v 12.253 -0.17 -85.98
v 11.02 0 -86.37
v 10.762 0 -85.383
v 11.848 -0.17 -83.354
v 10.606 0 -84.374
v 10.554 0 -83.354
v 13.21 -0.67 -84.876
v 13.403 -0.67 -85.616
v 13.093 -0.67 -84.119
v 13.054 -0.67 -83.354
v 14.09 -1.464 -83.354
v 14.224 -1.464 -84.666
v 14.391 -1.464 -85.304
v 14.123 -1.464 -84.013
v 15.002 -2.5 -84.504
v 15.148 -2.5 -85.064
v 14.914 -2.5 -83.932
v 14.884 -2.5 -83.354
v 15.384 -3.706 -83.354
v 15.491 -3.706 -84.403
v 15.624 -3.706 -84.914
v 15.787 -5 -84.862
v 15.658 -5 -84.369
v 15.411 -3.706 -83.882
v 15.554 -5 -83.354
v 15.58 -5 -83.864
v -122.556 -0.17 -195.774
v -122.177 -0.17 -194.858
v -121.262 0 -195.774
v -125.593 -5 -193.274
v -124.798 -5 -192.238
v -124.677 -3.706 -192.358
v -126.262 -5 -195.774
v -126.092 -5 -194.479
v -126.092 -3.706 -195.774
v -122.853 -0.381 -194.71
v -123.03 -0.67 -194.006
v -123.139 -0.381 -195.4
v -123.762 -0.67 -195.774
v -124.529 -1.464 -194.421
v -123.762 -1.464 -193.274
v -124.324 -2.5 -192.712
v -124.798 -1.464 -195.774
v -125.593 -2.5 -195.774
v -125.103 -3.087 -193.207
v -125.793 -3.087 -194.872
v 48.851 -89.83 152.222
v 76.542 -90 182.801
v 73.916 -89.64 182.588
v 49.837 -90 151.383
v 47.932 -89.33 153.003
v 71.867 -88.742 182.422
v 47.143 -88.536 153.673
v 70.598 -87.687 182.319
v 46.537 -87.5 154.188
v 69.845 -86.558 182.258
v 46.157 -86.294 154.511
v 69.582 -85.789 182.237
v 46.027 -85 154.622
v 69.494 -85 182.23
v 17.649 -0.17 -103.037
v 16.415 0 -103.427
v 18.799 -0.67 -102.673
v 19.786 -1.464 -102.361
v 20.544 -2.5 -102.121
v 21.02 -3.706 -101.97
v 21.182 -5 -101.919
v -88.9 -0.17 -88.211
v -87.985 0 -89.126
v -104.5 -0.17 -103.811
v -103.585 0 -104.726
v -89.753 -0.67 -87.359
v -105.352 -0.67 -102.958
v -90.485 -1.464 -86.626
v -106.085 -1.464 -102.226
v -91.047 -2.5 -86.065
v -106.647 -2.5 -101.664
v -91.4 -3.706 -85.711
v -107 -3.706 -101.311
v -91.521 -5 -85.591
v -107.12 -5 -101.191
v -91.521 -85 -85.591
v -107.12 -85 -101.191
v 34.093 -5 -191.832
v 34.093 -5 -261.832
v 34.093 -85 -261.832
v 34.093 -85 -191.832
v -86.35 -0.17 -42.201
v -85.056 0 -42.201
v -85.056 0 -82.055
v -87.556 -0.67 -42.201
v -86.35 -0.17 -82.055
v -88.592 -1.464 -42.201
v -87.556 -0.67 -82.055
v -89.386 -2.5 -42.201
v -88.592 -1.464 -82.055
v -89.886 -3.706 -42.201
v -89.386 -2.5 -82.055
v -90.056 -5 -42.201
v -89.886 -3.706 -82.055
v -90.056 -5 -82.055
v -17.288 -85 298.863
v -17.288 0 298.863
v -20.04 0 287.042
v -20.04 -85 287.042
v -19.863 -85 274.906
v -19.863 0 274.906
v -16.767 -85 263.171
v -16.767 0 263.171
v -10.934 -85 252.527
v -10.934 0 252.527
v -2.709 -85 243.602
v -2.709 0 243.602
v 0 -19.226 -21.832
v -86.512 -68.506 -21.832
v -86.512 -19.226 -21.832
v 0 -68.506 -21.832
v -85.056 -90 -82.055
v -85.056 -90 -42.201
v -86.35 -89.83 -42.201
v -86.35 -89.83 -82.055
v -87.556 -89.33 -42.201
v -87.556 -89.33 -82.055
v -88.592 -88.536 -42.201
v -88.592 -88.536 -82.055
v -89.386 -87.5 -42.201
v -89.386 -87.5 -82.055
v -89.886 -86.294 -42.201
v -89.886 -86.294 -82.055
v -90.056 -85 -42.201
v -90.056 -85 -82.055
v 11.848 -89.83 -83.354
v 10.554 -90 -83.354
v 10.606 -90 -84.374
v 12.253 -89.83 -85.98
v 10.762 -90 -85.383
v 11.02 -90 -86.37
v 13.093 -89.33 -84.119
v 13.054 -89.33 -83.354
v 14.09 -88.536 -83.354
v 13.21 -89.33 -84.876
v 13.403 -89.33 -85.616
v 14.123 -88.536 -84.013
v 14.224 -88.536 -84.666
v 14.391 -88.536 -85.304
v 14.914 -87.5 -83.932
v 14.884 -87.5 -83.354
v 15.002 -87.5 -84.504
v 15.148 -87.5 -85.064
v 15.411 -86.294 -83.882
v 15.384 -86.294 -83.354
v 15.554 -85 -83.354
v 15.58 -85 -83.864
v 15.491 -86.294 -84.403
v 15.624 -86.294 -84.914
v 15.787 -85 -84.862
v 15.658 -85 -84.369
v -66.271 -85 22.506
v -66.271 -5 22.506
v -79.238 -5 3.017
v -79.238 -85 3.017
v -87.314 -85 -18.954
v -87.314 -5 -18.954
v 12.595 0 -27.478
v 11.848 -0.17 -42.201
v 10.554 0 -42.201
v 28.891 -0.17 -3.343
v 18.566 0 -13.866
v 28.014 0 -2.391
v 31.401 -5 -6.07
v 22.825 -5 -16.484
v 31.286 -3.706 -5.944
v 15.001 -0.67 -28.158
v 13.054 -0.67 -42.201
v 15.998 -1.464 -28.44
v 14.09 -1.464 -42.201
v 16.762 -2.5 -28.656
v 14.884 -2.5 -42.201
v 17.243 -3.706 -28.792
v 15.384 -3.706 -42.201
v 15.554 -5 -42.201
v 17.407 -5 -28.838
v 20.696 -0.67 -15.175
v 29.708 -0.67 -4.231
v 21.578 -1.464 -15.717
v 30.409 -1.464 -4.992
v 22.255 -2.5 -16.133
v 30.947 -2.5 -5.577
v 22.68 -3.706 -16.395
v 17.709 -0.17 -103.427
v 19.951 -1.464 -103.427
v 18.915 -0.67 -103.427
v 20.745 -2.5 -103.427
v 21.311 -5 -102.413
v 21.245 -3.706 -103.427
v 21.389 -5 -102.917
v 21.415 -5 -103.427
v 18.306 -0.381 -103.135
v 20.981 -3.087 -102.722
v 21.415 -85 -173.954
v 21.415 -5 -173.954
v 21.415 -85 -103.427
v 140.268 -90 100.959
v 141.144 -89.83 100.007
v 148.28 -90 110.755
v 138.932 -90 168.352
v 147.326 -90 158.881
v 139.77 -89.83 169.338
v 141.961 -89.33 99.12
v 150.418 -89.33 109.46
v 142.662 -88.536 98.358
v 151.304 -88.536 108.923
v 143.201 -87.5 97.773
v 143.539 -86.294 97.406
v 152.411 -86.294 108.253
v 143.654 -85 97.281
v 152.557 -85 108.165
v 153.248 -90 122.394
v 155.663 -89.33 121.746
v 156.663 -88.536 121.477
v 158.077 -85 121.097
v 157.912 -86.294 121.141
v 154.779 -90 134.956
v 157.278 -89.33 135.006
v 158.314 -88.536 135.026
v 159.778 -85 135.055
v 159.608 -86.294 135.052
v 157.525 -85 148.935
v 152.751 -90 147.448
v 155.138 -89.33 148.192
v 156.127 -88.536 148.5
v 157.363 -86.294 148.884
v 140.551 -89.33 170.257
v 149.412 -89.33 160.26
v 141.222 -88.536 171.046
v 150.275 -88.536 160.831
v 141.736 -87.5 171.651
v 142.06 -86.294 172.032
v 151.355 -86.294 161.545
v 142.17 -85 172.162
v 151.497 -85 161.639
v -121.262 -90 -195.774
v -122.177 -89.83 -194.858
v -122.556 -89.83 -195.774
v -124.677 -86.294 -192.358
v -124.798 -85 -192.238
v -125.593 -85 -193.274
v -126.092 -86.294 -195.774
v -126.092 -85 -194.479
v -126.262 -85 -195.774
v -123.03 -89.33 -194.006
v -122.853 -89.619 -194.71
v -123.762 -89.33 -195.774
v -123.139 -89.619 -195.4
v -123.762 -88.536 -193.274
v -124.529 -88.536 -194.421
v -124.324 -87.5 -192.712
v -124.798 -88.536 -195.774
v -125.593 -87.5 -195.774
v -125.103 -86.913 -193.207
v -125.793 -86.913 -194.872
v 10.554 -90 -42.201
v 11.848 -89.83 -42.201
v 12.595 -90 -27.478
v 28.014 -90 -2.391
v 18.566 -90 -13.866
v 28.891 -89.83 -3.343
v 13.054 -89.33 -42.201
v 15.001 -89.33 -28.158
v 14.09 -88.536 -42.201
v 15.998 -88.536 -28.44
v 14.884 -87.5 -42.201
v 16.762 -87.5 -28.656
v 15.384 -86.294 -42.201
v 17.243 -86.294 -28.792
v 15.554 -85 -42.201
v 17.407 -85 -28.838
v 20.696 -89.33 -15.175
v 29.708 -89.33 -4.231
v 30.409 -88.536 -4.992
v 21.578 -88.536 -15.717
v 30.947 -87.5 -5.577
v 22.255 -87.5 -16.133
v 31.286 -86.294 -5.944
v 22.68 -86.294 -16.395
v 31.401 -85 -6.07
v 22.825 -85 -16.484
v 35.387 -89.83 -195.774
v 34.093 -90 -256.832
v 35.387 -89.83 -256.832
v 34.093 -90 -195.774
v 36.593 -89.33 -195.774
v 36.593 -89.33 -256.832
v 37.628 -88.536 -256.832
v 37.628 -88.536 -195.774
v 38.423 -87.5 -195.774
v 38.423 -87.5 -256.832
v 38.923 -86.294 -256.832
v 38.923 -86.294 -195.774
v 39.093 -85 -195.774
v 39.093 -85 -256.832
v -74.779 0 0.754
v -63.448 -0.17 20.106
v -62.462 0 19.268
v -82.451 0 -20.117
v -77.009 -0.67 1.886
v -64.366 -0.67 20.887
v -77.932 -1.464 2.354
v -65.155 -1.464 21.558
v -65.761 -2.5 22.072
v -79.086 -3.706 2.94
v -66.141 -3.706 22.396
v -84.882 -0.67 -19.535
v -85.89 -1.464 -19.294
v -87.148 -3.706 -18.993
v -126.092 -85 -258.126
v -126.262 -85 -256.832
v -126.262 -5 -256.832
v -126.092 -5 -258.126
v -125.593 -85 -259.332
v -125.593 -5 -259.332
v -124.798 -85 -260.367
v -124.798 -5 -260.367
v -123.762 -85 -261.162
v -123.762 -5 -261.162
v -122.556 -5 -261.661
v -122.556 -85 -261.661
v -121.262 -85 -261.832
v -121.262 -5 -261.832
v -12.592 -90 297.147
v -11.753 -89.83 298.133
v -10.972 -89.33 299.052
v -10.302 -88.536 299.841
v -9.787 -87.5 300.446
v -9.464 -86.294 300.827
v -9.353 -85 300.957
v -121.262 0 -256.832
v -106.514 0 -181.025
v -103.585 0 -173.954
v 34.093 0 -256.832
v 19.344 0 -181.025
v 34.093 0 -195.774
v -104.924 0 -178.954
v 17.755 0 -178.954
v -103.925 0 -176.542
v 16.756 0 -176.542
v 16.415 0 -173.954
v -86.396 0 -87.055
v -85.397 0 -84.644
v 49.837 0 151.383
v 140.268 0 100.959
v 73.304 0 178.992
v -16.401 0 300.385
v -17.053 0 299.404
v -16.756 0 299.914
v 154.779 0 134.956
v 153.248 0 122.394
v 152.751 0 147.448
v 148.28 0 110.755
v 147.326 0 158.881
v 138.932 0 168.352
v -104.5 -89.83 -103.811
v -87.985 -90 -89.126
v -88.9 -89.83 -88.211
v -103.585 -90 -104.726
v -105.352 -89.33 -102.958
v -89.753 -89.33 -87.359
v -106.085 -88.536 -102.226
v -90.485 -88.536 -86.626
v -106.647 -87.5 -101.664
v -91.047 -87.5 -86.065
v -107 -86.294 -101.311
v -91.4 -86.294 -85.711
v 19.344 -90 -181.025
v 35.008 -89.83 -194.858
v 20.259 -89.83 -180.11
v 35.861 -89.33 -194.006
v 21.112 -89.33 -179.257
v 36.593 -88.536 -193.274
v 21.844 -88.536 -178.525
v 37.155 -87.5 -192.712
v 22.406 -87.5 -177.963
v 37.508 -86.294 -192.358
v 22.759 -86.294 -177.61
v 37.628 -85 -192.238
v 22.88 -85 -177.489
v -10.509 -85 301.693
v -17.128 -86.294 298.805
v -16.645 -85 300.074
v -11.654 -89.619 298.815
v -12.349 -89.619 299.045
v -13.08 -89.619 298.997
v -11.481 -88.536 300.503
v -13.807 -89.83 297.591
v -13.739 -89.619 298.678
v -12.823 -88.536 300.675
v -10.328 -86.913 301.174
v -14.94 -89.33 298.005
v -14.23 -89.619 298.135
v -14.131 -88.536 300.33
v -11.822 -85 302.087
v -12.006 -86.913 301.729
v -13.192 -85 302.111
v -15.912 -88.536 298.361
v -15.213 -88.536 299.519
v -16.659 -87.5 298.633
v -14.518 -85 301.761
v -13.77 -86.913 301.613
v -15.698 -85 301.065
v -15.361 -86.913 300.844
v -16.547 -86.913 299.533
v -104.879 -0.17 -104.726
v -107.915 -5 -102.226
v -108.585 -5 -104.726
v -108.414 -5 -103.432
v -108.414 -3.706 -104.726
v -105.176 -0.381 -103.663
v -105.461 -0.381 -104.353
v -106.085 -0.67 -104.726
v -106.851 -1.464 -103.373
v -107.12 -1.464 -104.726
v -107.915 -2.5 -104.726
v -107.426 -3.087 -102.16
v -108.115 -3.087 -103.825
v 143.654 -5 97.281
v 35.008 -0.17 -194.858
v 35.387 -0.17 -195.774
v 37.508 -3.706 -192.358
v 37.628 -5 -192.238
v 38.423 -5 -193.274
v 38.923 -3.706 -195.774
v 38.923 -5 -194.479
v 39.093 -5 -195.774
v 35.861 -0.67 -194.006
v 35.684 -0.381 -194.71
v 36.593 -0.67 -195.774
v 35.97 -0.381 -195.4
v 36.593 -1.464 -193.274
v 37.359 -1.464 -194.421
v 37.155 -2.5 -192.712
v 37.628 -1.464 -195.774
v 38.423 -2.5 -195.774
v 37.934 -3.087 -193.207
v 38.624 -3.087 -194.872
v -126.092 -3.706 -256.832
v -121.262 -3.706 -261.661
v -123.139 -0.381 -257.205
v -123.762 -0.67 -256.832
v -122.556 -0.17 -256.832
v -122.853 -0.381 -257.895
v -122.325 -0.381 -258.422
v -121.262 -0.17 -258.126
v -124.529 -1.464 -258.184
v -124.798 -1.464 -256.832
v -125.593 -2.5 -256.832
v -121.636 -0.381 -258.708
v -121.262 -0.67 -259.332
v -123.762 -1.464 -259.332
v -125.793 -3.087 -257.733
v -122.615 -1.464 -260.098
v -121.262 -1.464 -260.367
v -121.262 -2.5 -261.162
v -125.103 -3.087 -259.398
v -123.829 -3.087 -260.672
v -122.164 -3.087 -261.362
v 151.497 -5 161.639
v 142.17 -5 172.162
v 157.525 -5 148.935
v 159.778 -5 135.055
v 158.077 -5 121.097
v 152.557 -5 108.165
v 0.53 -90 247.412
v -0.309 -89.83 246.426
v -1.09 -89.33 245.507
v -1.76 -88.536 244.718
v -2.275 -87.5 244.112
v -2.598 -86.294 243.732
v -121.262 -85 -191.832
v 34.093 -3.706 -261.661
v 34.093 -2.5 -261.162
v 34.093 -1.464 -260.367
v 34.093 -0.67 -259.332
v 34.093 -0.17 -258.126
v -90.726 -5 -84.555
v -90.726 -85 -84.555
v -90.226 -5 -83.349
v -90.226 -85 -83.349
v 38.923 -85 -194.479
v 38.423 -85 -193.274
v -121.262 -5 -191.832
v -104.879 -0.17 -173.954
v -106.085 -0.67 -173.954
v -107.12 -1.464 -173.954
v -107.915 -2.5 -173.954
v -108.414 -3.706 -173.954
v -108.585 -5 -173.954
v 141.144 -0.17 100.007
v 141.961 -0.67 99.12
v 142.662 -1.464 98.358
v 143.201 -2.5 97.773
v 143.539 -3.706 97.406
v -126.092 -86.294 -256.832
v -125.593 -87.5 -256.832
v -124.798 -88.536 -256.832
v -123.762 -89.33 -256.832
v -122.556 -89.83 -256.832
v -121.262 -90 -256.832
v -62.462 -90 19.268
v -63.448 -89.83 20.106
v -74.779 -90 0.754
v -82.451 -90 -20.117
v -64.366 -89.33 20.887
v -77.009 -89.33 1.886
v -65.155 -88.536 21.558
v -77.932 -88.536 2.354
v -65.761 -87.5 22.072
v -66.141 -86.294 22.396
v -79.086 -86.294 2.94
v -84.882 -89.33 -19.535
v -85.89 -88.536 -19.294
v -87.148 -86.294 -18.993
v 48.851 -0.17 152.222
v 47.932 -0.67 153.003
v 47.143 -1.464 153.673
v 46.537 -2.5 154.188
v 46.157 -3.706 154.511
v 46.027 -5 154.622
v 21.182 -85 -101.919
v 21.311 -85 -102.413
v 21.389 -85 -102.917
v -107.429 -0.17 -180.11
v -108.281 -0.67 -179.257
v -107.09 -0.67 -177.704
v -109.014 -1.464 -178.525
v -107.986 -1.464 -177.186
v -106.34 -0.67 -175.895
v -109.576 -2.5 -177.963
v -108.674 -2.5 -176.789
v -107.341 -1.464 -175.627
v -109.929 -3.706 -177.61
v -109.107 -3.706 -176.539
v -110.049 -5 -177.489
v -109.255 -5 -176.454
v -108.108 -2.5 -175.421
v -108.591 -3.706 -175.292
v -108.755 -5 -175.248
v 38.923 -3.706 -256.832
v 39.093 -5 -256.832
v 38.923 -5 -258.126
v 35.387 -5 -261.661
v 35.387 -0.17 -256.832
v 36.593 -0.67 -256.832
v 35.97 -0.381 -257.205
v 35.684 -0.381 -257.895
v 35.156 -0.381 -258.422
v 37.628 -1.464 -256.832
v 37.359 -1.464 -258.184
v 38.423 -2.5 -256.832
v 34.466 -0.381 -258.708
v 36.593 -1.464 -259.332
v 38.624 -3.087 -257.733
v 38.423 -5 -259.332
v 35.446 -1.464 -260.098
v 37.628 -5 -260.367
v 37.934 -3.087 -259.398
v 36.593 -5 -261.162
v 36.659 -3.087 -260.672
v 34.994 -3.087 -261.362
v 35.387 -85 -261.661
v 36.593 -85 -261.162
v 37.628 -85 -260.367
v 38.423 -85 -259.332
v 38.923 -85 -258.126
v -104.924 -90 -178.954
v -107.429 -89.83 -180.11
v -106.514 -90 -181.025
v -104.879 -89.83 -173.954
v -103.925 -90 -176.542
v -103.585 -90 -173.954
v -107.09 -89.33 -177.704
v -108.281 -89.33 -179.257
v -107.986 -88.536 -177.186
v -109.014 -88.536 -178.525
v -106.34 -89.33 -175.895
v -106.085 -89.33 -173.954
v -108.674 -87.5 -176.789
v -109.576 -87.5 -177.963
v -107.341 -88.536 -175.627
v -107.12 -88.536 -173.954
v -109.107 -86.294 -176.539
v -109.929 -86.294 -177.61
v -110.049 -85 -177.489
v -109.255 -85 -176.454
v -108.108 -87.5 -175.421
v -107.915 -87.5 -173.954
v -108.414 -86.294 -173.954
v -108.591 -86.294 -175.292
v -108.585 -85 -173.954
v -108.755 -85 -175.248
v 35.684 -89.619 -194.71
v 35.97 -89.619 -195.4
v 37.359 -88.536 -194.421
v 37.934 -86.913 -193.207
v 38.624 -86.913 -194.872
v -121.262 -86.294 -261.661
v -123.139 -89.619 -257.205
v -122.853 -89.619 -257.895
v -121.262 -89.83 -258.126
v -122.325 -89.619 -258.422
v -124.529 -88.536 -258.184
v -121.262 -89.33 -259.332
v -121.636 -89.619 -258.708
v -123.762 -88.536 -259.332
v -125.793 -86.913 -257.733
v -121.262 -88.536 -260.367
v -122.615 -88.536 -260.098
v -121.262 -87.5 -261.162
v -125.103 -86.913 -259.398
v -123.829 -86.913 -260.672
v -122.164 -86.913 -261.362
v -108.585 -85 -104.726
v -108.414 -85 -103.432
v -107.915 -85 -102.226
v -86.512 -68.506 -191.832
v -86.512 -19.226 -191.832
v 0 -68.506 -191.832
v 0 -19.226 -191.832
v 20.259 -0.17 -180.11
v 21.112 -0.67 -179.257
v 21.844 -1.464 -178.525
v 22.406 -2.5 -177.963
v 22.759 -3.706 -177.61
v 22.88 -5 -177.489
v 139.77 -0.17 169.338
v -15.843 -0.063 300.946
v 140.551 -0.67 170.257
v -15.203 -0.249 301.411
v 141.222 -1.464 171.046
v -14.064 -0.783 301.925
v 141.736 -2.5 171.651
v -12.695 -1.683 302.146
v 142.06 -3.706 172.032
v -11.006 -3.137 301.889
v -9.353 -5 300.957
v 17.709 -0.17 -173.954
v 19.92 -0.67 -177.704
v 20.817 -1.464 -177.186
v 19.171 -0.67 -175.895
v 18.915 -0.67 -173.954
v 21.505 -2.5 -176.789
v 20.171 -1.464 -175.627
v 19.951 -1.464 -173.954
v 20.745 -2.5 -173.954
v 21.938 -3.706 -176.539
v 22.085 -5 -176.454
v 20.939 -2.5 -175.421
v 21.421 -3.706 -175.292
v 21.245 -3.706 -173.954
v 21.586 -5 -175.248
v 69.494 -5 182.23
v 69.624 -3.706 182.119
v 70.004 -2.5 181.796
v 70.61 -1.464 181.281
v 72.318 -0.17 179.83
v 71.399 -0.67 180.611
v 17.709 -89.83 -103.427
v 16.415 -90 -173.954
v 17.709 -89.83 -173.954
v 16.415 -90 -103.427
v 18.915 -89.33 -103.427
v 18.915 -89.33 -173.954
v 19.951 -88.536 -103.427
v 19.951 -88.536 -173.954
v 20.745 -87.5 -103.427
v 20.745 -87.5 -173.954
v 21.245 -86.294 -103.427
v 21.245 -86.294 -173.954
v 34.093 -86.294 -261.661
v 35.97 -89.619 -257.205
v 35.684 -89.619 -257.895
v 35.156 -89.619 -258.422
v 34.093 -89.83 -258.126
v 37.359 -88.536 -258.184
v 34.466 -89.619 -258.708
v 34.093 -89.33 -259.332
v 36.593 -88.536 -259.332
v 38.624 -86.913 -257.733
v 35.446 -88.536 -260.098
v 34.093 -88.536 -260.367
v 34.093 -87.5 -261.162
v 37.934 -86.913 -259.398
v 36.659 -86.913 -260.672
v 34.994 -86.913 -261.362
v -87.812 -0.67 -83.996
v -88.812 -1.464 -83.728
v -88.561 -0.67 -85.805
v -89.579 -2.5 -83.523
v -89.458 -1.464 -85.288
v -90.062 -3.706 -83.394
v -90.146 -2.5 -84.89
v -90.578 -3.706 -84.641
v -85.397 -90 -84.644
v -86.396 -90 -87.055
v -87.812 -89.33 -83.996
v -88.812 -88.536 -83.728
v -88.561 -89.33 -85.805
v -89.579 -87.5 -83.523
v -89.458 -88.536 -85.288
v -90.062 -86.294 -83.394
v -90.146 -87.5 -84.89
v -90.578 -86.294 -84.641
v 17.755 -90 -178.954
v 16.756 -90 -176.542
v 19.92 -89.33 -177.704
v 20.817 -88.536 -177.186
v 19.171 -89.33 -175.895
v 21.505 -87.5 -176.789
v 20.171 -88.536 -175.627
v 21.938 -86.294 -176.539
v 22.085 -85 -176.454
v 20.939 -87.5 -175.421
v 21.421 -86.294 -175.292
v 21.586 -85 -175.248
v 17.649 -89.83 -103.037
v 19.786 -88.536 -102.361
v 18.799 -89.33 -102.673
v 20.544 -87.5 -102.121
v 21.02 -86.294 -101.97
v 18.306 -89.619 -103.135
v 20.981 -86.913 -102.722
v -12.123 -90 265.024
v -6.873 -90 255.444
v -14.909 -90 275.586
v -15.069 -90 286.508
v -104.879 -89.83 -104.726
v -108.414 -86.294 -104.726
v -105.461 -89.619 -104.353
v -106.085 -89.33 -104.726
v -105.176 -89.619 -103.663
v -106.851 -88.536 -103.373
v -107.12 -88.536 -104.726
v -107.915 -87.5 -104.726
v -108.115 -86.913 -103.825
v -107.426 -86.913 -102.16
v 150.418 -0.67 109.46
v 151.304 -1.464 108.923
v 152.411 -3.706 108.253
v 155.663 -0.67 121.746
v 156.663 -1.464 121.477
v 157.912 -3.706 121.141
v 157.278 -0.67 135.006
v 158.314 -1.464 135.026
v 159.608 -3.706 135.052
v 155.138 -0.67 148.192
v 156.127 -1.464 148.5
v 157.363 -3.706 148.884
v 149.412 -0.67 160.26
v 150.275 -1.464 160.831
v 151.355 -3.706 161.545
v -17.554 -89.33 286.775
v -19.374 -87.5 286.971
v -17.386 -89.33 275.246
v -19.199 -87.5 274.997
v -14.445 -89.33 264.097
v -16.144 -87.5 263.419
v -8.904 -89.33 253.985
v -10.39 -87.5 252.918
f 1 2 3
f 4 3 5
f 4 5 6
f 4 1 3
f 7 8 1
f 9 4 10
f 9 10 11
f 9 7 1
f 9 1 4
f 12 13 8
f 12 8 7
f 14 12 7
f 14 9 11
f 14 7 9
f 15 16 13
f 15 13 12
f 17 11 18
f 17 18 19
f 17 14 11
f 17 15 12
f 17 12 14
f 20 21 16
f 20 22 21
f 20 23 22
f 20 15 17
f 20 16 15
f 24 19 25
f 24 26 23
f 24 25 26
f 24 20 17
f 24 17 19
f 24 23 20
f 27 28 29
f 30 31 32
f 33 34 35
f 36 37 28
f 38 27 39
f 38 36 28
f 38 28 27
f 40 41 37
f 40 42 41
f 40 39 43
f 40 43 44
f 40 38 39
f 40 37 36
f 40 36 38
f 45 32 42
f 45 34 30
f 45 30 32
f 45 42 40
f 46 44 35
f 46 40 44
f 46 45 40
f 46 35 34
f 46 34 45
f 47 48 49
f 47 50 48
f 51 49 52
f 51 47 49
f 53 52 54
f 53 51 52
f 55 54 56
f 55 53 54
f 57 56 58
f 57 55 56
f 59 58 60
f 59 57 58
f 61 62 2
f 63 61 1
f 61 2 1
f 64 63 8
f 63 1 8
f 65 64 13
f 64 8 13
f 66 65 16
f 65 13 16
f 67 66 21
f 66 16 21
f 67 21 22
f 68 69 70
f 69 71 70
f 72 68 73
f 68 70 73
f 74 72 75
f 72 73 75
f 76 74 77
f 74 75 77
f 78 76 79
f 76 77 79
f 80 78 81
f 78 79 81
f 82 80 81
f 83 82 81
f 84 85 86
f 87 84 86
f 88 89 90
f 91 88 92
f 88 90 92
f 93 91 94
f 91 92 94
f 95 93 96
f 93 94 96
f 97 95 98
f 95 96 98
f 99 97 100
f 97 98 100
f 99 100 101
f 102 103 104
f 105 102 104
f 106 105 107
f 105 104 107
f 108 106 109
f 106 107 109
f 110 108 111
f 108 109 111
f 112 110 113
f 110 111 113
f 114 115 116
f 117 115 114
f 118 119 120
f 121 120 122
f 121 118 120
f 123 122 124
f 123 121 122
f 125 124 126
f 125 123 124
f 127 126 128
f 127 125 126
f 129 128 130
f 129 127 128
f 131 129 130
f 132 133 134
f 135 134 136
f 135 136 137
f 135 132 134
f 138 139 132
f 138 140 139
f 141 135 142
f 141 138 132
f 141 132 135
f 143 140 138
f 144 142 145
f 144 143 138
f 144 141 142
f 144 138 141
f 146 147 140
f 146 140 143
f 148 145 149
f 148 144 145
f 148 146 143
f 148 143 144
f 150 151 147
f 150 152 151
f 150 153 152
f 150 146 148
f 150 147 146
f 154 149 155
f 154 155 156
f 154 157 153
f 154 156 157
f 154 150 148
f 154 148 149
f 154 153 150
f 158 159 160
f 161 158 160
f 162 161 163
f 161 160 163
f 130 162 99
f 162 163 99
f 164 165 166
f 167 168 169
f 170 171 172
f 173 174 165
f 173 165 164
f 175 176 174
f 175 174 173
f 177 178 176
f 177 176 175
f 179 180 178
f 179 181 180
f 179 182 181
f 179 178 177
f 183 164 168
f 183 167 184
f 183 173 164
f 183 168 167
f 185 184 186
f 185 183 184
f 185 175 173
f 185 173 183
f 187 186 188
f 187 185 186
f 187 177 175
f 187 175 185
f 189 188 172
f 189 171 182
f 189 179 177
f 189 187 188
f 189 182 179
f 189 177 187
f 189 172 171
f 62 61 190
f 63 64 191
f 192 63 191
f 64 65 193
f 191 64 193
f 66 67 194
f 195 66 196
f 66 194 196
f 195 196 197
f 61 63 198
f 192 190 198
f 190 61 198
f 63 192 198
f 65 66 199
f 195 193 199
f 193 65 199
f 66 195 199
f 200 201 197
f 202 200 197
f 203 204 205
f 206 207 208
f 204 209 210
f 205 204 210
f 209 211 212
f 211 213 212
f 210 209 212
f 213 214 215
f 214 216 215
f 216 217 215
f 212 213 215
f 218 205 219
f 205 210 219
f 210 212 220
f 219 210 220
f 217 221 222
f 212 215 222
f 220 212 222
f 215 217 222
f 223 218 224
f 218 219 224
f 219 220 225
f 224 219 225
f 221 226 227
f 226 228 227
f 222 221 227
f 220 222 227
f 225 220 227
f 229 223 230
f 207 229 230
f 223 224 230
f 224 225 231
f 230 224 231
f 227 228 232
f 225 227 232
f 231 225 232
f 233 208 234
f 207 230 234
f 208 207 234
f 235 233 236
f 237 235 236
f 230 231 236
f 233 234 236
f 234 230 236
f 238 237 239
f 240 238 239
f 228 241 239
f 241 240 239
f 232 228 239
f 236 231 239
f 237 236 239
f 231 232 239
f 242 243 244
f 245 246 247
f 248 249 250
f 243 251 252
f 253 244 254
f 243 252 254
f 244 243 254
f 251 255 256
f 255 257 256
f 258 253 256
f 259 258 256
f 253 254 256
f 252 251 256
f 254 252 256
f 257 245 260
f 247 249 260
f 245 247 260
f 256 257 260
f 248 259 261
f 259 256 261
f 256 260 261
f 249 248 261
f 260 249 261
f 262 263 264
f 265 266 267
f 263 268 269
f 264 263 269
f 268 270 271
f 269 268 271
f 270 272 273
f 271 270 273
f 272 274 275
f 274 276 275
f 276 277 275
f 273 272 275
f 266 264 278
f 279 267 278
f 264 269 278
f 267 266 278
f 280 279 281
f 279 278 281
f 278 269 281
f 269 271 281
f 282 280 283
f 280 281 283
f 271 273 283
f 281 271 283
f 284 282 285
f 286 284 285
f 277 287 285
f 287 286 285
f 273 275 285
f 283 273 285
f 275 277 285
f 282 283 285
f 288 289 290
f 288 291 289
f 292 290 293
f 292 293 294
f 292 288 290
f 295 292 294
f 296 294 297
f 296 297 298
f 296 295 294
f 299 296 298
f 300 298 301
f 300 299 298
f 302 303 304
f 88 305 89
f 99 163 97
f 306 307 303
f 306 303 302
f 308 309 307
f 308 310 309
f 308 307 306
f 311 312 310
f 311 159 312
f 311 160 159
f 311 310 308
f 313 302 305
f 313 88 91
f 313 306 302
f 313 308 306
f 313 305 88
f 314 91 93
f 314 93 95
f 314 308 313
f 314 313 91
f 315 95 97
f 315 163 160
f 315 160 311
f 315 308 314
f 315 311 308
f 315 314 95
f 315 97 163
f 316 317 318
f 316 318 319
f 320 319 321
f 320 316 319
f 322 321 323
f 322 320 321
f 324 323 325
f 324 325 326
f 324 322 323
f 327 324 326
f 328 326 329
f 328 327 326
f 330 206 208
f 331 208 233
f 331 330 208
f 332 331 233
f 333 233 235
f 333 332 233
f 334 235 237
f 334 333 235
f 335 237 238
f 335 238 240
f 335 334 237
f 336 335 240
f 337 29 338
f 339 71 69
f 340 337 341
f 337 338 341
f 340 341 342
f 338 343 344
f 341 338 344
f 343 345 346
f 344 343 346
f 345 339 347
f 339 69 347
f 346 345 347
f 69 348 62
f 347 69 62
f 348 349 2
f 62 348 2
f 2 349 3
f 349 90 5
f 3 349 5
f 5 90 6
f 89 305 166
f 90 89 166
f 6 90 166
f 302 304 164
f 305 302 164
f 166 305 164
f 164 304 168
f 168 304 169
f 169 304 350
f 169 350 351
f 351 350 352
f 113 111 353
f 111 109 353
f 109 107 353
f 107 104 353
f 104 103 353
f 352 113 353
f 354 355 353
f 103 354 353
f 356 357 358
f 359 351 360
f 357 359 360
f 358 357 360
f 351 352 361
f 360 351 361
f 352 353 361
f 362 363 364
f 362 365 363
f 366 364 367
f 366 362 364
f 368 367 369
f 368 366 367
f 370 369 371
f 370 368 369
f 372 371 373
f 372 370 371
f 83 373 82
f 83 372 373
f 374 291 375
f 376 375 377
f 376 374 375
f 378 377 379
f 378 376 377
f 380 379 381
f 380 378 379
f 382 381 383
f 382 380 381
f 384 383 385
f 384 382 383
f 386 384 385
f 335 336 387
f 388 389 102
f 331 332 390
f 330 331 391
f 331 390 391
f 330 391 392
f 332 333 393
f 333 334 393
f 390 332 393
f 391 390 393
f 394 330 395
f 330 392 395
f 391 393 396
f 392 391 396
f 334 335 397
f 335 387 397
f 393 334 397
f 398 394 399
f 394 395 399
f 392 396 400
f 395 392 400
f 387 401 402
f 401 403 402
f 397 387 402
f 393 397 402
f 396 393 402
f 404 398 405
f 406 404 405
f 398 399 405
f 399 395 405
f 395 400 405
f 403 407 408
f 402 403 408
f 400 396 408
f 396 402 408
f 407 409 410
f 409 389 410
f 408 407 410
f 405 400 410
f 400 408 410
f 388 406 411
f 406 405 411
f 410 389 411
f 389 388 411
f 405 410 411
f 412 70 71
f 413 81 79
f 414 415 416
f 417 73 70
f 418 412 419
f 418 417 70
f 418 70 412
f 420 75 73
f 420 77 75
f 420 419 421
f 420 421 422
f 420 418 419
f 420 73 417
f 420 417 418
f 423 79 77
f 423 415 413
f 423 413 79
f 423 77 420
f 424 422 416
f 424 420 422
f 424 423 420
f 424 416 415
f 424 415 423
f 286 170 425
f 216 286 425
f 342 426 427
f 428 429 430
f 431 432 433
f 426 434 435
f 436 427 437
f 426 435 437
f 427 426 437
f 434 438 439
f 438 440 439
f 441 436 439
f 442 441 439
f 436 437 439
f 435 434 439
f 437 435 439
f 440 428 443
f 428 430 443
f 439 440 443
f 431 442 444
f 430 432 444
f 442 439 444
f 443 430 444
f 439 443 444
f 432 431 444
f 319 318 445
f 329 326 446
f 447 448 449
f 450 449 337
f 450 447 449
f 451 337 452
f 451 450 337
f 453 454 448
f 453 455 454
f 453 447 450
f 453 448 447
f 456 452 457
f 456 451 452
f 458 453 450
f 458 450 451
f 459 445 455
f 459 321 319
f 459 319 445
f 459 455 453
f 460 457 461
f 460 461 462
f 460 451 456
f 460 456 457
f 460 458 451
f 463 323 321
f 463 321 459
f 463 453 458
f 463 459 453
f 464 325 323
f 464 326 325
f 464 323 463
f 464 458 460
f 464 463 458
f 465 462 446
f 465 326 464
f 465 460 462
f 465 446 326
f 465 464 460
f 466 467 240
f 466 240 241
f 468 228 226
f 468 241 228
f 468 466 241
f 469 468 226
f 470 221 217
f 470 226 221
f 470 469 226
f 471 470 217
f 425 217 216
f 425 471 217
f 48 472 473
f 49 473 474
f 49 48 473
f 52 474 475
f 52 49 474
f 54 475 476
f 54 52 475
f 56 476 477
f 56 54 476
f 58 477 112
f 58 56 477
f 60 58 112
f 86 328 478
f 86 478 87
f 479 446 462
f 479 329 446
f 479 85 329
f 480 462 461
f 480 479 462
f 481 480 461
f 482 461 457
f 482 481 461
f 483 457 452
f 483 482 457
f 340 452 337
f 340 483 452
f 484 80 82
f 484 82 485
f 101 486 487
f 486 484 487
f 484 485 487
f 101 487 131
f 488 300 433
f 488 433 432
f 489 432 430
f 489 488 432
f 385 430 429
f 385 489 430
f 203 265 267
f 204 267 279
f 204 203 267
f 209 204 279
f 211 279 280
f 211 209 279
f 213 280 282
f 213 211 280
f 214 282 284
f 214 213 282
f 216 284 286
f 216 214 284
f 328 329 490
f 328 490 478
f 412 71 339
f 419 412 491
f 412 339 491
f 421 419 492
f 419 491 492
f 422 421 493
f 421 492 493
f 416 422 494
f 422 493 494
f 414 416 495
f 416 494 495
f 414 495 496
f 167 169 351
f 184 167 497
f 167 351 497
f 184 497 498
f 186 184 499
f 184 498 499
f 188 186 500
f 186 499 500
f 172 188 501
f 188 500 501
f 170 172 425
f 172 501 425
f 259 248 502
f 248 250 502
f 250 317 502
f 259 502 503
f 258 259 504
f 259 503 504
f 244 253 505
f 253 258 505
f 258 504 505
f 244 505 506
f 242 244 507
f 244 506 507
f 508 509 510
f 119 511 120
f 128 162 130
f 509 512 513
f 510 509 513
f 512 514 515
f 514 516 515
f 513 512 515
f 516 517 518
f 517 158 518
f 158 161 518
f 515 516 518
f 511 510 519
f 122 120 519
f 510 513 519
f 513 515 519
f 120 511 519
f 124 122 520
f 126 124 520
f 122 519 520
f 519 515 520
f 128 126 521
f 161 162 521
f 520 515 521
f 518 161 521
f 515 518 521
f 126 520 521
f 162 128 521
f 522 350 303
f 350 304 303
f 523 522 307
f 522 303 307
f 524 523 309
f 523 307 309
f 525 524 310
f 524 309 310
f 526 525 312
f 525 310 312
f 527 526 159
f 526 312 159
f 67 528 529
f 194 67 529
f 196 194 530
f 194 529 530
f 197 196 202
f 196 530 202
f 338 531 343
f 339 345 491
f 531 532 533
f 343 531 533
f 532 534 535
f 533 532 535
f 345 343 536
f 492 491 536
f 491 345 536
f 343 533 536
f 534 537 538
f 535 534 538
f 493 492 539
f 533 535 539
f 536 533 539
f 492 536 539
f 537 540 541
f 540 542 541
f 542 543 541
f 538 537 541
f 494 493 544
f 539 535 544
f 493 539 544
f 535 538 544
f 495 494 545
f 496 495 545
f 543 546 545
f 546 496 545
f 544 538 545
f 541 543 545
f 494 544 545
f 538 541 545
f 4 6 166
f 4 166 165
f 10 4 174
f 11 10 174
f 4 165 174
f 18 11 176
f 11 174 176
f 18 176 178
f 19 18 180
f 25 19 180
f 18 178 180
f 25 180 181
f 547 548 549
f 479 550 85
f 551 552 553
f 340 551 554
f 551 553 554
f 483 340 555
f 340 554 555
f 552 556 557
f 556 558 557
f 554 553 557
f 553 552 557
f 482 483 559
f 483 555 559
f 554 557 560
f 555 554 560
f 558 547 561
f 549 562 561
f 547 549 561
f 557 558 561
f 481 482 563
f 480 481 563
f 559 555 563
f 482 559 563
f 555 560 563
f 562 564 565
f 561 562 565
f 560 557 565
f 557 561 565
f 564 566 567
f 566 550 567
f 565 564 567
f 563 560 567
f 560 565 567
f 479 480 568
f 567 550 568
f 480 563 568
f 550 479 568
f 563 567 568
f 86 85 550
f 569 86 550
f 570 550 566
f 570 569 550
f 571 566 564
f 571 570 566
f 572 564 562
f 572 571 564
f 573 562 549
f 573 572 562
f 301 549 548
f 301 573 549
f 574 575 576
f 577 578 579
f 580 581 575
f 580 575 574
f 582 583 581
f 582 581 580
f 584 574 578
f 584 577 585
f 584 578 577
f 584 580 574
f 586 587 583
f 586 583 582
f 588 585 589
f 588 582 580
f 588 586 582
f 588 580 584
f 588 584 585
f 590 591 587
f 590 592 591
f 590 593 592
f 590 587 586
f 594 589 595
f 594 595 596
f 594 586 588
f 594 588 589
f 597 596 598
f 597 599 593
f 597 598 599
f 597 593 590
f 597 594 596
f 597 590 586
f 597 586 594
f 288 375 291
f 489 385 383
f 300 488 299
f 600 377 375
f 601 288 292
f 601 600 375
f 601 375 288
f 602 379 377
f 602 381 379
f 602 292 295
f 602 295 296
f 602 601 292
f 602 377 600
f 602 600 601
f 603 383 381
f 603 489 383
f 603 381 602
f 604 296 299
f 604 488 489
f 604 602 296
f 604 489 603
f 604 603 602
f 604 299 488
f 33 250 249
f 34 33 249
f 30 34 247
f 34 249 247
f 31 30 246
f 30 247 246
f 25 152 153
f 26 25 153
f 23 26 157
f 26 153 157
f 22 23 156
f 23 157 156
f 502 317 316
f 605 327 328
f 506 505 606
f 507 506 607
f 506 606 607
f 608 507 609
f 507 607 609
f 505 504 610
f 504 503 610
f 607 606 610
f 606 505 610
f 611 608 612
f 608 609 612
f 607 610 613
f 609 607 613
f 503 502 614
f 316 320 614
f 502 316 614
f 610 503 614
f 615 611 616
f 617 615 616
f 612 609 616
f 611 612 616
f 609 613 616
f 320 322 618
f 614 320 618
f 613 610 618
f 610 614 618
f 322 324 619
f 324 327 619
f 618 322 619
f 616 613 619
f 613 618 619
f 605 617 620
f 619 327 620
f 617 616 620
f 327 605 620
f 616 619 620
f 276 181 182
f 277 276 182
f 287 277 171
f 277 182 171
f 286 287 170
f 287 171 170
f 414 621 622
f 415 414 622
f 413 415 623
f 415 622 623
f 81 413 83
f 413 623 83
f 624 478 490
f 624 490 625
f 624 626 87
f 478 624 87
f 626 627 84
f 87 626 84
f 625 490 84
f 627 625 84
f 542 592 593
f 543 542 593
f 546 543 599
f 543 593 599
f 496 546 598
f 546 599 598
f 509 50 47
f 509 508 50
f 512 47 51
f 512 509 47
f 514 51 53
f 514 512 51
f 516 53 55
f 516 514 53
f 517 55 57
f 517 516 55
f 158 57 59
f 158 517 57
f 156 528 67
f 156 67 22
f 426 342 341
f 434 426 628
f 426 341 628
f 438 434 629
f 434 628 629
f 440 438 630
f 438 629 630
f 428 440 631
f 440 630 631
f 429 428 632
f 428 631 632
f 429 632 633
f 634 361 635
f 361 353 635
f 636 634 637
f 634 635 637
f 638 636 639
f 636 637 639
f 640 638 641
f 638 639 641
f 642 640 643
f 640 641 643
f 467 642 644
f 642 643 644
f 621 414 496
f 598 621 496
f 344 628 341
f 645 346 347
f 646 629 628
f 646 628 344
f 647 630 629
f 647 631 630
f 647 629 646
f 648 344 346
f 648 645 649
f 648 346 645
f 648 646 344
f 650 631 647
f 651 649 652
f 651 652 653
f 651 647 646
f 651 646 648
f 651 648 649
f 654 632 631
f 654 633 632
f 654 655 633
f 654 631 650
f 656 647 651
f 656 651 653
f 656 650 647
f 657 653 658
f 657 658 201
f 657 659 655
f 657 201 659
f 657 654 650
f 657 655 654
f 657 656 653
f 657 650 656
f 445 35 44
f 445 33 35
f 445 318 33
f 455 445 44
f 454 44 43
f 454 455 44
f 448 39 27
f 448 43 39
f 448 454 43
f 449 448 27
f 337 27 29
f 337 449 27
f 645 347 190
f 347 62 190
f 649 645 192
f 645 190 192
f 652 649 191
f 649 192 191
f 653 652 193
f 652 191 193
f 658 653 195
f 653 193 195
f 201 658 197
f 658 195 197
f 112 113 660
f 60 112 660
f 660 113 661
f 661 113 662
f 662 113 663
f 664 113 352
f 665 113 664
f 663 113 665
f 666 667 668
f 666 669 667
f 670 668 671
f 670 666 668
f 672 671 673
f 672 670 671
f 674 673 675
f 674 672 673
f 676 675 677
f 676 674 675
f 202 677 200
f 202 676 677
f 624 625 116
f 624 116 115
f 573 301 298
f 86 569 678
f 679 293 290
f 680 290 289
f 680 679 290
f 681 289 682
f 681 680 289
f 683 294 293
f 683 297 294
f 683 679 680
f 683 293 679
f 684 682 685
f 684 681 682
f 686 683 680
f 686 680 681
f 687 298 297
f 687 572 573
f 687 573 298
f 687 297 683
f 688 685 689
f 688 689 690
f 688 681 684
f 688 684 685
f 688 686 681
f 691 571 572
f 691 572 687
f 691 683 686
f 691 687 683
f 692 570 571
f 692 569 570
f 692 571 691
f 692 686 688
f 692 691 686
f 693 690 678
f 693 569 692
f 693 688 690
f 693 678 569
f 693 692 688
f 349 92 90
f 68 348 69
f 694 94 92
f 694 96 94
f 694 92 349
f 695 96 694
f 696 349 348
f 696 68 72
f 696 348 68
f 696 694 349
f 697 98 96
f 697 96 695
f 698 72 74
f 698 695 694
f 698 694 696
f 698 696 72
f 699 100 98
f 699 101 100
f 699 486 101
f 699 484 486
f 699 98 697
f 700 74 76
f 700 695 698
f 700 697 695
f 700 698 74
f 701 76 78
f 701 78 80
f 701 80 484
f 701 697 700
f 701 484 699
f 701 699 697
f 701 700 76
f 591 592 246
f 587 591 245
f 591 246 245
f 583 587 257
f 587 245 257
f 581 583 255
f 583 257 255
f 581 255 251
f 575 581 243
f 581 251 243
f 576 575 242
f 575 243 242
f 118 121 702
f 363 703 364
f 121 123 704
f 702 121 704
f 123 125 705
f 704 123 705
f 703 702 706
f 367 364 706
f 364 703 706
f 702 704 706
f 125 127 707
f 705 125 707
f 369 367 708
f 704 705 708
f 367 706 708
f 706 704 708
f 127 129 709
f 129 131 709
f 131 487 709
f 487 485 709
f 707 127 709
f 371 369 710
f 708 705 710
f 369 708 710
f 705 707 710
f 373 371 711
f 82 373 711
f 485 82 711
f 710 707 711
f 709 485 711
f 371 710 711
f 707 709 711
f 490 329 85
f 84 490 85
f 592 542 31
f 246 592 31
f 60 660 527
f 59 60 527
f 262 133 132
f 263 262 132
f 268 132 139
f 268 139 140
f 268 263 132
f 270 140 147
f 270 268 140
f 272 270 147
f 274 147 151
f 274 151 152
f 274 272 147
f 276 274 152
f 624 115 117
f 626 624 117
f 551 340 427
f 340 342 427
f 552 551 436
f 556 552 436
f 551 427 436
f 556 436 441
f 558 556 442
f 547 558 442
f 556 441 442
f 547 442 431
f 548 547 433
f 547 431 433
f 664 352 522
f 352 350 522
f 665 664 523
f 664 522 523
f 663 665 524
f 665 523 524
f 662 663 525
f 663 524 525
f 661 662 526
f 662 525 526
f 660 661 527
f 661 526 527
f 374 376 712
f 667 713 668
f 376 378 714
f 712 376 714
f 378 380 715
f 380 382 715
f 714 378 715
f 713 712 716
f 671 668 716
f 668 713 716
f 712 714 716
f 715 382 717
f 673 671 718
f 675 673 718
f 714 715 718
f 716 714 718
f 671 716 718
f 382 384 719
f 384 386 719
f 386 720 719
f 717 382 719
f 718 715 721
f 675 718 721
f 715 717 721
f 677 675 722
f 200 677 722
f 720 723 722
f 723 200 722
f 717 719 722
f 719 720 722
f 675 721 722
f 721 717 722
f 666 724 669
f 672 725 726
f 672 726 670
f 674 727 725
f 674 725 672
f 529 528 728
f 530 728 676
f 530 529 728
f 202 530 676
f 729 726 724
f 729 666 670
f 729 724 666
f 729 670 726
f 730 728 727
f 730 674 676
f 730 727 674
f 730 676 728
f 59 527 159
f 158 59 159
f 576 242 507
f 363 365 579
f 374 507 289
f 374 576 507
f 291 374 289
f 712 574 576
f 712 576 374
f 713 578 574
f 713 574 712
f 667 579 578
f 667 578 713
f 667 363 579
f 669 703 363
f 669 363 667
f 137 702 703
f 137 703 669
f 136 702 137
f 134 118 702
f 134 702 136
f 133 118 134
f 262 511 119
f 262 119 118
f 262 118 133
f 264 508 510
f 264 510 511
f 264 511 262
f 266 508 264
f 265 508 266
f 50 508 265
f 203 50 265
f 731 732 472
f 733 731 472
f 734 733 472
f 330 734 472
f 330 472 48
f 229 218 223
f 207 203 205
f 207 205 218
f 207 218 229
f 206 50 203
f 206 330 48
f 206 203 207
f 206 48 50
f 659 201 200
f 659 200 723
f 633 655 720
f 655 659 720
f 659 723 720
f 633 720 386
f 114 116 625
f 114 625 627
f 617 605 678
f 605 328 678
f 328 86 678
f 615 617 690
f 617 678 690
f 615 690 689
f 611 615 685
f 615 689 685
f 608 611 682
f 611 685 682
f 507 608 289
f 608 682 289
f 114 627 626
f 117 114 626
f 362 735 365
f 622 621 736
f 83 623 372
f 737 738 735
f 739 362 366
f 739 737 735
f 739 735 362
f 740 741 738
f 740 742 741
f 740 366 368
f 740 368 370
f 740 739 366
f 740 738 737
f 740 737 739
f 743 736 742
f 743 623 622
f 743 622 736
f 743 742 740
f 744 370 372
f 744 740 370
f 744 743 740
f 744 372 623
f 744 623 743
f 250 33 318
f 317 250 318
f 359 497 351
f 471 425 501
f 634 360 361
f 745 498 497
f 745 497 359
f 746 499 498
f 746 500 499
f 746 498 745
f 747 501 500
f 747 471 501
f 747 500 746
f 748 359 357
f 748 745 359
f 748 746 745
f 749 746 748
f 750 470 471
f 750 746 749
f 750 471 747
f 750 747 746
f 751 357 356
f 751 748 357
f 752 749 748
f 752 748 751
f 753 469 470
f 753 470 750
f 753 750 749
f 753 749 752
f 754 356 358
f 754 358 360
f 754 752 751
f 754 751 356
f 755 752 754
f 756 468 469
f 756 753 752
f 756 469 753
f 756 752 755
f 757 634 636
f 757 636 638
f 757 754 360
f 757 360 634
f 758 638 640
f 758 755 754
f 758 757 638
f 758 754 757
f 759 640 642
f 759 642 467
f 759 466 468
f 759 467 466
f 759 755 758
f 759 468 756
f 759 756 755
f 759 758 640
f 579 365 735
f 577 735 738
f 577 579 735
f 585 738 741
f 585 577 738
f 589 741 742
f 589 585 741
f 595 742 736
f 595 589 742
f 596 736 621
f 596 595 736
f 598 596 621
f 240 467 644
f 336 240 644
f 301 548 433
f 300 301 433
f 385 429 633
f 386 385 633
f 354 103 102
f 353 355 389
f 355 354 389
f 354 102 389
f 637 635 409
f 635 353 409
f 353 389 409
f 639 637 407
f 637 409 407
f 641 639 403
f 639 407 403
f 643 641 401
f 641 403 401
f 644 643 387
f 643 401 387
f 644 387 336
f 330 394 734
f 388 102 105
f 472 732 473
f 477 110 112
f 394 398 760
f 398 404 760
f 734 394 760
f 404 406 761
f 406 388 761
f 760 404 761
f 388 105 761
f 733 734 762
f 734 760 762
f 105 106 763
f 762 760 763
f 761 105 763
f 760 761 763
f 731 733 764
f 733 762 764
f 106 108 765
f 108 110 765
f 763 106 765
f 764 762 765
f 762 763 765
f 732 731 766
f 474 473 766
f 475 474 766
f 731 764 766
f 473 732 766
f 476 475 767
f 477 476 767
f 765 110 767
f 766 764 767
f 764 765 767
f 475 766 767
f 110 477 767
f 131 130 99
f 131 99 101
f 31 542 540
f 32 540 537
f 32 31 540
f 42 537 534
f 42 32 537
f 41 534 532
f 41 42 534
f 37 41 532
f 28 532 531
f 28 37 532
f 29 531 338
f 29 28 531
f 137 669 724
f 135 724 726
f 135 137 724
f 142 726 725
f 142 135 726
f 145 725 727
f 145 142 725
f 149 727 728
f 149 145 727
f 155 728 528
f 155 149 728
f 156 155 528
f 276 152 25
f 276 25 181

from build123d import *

# Parameters (mm, degrees)
F1_DEPTH    = 90
F2_T1_DEPTH = 507.1106760185
F2_T3_DEPTH = 372.5735965904
F3_R        = 5
F4_DEPTH    = 70
F5_W        = 86.5122303367
F5_H        = 49.2804106325
F6_DEPTH    = 170


# Not quite as in the source:
# - a fillet or chamfer that OpenCascade refuses, or shapes differently, is made with other operations: its cross-section is extruded or revolved along the edge and cut away or added


with BuildPart() as f1:
    # F0 (on Front) → F1 (new body)
    with BuildSketch(Plane.XZ):
        with BuildLine():
            Line((-126.2623920763, -193.7024648741), (-126.2623920763, -261.8315013925))
            Line((-126.2623920763, -261.8315013925), (39.092946983, -261.8315013925))
            Line((39.092946983, -261.8315013925), (39.092946983, -193.7024648741))
            Line((39.092946983, -193.7024648741), (21.4152774533, -176.0247953445))
            Line((21.4152774533, -176.0247953445), (21.4152774533, -102.6550637093))
            Line((21.4152774533, -102.6550637093), (15.5539703198, -84.1264084333))
            Line((15.5539703198, -84.1264084333), (15.5539703198, -42.2008474989))
            ThreePointArc((15.5539703198, -42.2008474989), (19.6898884351, -22.4740848198), (31.401046165, -6.0698241209))
            Line((31.401046165, -6.0698241209), (185.2309488965, 135.5598457642))
            Line((185.2309488965, 135.5598457642), (-14.4236341973, 305.266241394))
            Line((-14.4236341973, 305.266241394), (-66.2712781132, 297.6301199255))
            Line((-66.2712781132, 297.6301199255), (-11.4975965547, 251.0724906007))
            Line((-11.4975965547, 251.0724906007), (69.4938383905, 182.2297708973))
            Line((69.4938383905, 182.2297708973), (46.0270096541, 154.6217370896))
            Line((46.0270096541, 154.6217370896), (-66.2712781132, 22.5061044222))
            ThreePointArc((-66.2712781132, 22.5061044222), (-83.9215394862, -7.7309119674), (-90.0560672706, -42.2008474989))
            Line((-90.0560672706, -42.2008474989), (-90.0560672706, -84.1264084333))
            Line((-90.0560672706, -84.1264084333), (-108.5847225467, -102.6550637093))
            Line((-108.5847225467, -102.6550637093), (-108.5847225467, -176.0247953445))
            Line((-108.5847225467, -176.0247953445), (-126.2623920763, -193.7024648741))
        make_face()
    extrude(amount=F1_DEPTH)

    # F2: fillet of radius 50 on 2 edges, made by hand

    # F2_s2 → F2_t1 (cut)
    with BuildSketch(Plane.XZ.offset(-208.5553380092)):
        with BuildLine():
            ThreePointArc((-14.4236341973, 305.266241394), (-19.4476593821, 272.3668104124), (-2.7086733301, 243.6019058598))
            Line((-2.7086733301, 243.6019058598), (-66.2712781132, 297.6301199255))
            Line((-66.2712781132, 297.6301199255), (-14.4236341973, 305.266241394))
        make_face()
    extrude(amount=F2_T1_DEPTH, mode=Mode.SUBTRACT)

    # F2_s4 → F2_t3 (cut)
    with BuildSketch(Plane.XZ.offset(-141.2867982952)):
        with BuildLine():
            ThreePointArc((142.1701622159, 172.1615144427), (159.7779231252, 135.0553624638), (143.6543137068, 97.2806489872))
            Line((143.6543137068, 97.2806489872), (185.2309488965, 135.5598457642))
            Line((185.2309488965, 135.5598457642), (142.1701622159, 172.1615144427))
        make_face()
    extrude(amount=F2_T3_DEPTH, mode=Mode.SUBTRACT)

    # F3
    f3_edges = [f1.edges().sort_by_distance(p)[0] for p in [
        (39.092947, -45, -193.702465),
        (21.415277, -45, -176.024795),
        (30.254112, 0, -184.86363),
        (30.254112, -90, -184.86363),
        (-108.584723, 0, -139.33993),
        (-108.584723, -45, -176.024795),
        (-126.262392, -45, -193.702465),
        (-117.423557, 0, -184.86363),
        (-117.423557, -90, -184.86363),
        (-126.262392, -45, -261.831501),
        (-126.262392, 0, -227.766983),
        (-126.262392, -90, -227.766983),
        (-108.584723, -45, -102.655064),
        (-90.056067, -45, -42.200847),
        (-90.056067, -45, -84.126408),
        (-90.056067, 0, -63.163628),
        (-90.056067, -90, -63.163628),
        (-66.271278, -45, 22.506104),
        (-83.921539, 0, -7.730912),
        (-83.921539, -90, -7.730912),
        (63.873264, 0, 238.713878),
        (-14.423634, -45, 305.266241),
        (63.873264, -90, 238.713878),
        (142.170162, -45, 172.161514),
        (39.092947, -45, -261.831501),
        (39.092947, 0, -227.766983),
        (39.092947, -90, -227.766983),
        (-43.584723, 0, -261.831501),
        (1.61128, -90, 102.367938),
        (33.392583, -90, 212.915838),
        (-19.447659, -90, 272.36681),
        (159.777923, -90, 135.055362),
        (87.52768, -90, 45.605412),
        (19.689888, -90, -22.474085),
        (15.55397, -90, -63.163628),
        (18.484624, -90, -93.390736),
        (21.415277, -90, -139.33993),
        (-43.584723, -90, -261.831501),
        (-108.584723, -90, -139.33993),
        (-99.320395, -90, -93.390736),
        (21.415277, -45, -102.655064),
        (15.55397, -45, -84.126408),
        (18.484624, 0, -93.390736),
        (1.61128, 0, 102.367938),
        (159.777923, 0, 135.055362),
        (87.52768, 0, 45.605412),
        (19.689888, 0, -22.474085),
        (15.55397, 0, -63.163628),
        (21.415277, 0, -139.33993),
        (-99.320395, 0, -93.390736),
    ]]
    fillet(f3_edges, radius=F3_R)

    # F4 (cut): a face of the model
    f4_faces = [f1.faces().sort_by_distance(p)[0] for p in [
        (-43.5847225467, -45, -261.8315013925),
    ]]
    extrude(f4_faces, amount=-F4_DEPTH, mode=Mode.SUBTRACT)

    # F5 (on face) → F6 (cut)
    with BuildSketch(Plane(origin=(0, 0, -191.8315013925), x_dir=(1, 0, 0), z_dir=(0, 0, -1))):
        with Locations((-43.2561151683, 43.8658641651)):
            Rectangle(F5_W, F5_H)
    extrude(amount=-F6_DEPTH, mode=Mode.SUBTRACT)


solid = f1.part
